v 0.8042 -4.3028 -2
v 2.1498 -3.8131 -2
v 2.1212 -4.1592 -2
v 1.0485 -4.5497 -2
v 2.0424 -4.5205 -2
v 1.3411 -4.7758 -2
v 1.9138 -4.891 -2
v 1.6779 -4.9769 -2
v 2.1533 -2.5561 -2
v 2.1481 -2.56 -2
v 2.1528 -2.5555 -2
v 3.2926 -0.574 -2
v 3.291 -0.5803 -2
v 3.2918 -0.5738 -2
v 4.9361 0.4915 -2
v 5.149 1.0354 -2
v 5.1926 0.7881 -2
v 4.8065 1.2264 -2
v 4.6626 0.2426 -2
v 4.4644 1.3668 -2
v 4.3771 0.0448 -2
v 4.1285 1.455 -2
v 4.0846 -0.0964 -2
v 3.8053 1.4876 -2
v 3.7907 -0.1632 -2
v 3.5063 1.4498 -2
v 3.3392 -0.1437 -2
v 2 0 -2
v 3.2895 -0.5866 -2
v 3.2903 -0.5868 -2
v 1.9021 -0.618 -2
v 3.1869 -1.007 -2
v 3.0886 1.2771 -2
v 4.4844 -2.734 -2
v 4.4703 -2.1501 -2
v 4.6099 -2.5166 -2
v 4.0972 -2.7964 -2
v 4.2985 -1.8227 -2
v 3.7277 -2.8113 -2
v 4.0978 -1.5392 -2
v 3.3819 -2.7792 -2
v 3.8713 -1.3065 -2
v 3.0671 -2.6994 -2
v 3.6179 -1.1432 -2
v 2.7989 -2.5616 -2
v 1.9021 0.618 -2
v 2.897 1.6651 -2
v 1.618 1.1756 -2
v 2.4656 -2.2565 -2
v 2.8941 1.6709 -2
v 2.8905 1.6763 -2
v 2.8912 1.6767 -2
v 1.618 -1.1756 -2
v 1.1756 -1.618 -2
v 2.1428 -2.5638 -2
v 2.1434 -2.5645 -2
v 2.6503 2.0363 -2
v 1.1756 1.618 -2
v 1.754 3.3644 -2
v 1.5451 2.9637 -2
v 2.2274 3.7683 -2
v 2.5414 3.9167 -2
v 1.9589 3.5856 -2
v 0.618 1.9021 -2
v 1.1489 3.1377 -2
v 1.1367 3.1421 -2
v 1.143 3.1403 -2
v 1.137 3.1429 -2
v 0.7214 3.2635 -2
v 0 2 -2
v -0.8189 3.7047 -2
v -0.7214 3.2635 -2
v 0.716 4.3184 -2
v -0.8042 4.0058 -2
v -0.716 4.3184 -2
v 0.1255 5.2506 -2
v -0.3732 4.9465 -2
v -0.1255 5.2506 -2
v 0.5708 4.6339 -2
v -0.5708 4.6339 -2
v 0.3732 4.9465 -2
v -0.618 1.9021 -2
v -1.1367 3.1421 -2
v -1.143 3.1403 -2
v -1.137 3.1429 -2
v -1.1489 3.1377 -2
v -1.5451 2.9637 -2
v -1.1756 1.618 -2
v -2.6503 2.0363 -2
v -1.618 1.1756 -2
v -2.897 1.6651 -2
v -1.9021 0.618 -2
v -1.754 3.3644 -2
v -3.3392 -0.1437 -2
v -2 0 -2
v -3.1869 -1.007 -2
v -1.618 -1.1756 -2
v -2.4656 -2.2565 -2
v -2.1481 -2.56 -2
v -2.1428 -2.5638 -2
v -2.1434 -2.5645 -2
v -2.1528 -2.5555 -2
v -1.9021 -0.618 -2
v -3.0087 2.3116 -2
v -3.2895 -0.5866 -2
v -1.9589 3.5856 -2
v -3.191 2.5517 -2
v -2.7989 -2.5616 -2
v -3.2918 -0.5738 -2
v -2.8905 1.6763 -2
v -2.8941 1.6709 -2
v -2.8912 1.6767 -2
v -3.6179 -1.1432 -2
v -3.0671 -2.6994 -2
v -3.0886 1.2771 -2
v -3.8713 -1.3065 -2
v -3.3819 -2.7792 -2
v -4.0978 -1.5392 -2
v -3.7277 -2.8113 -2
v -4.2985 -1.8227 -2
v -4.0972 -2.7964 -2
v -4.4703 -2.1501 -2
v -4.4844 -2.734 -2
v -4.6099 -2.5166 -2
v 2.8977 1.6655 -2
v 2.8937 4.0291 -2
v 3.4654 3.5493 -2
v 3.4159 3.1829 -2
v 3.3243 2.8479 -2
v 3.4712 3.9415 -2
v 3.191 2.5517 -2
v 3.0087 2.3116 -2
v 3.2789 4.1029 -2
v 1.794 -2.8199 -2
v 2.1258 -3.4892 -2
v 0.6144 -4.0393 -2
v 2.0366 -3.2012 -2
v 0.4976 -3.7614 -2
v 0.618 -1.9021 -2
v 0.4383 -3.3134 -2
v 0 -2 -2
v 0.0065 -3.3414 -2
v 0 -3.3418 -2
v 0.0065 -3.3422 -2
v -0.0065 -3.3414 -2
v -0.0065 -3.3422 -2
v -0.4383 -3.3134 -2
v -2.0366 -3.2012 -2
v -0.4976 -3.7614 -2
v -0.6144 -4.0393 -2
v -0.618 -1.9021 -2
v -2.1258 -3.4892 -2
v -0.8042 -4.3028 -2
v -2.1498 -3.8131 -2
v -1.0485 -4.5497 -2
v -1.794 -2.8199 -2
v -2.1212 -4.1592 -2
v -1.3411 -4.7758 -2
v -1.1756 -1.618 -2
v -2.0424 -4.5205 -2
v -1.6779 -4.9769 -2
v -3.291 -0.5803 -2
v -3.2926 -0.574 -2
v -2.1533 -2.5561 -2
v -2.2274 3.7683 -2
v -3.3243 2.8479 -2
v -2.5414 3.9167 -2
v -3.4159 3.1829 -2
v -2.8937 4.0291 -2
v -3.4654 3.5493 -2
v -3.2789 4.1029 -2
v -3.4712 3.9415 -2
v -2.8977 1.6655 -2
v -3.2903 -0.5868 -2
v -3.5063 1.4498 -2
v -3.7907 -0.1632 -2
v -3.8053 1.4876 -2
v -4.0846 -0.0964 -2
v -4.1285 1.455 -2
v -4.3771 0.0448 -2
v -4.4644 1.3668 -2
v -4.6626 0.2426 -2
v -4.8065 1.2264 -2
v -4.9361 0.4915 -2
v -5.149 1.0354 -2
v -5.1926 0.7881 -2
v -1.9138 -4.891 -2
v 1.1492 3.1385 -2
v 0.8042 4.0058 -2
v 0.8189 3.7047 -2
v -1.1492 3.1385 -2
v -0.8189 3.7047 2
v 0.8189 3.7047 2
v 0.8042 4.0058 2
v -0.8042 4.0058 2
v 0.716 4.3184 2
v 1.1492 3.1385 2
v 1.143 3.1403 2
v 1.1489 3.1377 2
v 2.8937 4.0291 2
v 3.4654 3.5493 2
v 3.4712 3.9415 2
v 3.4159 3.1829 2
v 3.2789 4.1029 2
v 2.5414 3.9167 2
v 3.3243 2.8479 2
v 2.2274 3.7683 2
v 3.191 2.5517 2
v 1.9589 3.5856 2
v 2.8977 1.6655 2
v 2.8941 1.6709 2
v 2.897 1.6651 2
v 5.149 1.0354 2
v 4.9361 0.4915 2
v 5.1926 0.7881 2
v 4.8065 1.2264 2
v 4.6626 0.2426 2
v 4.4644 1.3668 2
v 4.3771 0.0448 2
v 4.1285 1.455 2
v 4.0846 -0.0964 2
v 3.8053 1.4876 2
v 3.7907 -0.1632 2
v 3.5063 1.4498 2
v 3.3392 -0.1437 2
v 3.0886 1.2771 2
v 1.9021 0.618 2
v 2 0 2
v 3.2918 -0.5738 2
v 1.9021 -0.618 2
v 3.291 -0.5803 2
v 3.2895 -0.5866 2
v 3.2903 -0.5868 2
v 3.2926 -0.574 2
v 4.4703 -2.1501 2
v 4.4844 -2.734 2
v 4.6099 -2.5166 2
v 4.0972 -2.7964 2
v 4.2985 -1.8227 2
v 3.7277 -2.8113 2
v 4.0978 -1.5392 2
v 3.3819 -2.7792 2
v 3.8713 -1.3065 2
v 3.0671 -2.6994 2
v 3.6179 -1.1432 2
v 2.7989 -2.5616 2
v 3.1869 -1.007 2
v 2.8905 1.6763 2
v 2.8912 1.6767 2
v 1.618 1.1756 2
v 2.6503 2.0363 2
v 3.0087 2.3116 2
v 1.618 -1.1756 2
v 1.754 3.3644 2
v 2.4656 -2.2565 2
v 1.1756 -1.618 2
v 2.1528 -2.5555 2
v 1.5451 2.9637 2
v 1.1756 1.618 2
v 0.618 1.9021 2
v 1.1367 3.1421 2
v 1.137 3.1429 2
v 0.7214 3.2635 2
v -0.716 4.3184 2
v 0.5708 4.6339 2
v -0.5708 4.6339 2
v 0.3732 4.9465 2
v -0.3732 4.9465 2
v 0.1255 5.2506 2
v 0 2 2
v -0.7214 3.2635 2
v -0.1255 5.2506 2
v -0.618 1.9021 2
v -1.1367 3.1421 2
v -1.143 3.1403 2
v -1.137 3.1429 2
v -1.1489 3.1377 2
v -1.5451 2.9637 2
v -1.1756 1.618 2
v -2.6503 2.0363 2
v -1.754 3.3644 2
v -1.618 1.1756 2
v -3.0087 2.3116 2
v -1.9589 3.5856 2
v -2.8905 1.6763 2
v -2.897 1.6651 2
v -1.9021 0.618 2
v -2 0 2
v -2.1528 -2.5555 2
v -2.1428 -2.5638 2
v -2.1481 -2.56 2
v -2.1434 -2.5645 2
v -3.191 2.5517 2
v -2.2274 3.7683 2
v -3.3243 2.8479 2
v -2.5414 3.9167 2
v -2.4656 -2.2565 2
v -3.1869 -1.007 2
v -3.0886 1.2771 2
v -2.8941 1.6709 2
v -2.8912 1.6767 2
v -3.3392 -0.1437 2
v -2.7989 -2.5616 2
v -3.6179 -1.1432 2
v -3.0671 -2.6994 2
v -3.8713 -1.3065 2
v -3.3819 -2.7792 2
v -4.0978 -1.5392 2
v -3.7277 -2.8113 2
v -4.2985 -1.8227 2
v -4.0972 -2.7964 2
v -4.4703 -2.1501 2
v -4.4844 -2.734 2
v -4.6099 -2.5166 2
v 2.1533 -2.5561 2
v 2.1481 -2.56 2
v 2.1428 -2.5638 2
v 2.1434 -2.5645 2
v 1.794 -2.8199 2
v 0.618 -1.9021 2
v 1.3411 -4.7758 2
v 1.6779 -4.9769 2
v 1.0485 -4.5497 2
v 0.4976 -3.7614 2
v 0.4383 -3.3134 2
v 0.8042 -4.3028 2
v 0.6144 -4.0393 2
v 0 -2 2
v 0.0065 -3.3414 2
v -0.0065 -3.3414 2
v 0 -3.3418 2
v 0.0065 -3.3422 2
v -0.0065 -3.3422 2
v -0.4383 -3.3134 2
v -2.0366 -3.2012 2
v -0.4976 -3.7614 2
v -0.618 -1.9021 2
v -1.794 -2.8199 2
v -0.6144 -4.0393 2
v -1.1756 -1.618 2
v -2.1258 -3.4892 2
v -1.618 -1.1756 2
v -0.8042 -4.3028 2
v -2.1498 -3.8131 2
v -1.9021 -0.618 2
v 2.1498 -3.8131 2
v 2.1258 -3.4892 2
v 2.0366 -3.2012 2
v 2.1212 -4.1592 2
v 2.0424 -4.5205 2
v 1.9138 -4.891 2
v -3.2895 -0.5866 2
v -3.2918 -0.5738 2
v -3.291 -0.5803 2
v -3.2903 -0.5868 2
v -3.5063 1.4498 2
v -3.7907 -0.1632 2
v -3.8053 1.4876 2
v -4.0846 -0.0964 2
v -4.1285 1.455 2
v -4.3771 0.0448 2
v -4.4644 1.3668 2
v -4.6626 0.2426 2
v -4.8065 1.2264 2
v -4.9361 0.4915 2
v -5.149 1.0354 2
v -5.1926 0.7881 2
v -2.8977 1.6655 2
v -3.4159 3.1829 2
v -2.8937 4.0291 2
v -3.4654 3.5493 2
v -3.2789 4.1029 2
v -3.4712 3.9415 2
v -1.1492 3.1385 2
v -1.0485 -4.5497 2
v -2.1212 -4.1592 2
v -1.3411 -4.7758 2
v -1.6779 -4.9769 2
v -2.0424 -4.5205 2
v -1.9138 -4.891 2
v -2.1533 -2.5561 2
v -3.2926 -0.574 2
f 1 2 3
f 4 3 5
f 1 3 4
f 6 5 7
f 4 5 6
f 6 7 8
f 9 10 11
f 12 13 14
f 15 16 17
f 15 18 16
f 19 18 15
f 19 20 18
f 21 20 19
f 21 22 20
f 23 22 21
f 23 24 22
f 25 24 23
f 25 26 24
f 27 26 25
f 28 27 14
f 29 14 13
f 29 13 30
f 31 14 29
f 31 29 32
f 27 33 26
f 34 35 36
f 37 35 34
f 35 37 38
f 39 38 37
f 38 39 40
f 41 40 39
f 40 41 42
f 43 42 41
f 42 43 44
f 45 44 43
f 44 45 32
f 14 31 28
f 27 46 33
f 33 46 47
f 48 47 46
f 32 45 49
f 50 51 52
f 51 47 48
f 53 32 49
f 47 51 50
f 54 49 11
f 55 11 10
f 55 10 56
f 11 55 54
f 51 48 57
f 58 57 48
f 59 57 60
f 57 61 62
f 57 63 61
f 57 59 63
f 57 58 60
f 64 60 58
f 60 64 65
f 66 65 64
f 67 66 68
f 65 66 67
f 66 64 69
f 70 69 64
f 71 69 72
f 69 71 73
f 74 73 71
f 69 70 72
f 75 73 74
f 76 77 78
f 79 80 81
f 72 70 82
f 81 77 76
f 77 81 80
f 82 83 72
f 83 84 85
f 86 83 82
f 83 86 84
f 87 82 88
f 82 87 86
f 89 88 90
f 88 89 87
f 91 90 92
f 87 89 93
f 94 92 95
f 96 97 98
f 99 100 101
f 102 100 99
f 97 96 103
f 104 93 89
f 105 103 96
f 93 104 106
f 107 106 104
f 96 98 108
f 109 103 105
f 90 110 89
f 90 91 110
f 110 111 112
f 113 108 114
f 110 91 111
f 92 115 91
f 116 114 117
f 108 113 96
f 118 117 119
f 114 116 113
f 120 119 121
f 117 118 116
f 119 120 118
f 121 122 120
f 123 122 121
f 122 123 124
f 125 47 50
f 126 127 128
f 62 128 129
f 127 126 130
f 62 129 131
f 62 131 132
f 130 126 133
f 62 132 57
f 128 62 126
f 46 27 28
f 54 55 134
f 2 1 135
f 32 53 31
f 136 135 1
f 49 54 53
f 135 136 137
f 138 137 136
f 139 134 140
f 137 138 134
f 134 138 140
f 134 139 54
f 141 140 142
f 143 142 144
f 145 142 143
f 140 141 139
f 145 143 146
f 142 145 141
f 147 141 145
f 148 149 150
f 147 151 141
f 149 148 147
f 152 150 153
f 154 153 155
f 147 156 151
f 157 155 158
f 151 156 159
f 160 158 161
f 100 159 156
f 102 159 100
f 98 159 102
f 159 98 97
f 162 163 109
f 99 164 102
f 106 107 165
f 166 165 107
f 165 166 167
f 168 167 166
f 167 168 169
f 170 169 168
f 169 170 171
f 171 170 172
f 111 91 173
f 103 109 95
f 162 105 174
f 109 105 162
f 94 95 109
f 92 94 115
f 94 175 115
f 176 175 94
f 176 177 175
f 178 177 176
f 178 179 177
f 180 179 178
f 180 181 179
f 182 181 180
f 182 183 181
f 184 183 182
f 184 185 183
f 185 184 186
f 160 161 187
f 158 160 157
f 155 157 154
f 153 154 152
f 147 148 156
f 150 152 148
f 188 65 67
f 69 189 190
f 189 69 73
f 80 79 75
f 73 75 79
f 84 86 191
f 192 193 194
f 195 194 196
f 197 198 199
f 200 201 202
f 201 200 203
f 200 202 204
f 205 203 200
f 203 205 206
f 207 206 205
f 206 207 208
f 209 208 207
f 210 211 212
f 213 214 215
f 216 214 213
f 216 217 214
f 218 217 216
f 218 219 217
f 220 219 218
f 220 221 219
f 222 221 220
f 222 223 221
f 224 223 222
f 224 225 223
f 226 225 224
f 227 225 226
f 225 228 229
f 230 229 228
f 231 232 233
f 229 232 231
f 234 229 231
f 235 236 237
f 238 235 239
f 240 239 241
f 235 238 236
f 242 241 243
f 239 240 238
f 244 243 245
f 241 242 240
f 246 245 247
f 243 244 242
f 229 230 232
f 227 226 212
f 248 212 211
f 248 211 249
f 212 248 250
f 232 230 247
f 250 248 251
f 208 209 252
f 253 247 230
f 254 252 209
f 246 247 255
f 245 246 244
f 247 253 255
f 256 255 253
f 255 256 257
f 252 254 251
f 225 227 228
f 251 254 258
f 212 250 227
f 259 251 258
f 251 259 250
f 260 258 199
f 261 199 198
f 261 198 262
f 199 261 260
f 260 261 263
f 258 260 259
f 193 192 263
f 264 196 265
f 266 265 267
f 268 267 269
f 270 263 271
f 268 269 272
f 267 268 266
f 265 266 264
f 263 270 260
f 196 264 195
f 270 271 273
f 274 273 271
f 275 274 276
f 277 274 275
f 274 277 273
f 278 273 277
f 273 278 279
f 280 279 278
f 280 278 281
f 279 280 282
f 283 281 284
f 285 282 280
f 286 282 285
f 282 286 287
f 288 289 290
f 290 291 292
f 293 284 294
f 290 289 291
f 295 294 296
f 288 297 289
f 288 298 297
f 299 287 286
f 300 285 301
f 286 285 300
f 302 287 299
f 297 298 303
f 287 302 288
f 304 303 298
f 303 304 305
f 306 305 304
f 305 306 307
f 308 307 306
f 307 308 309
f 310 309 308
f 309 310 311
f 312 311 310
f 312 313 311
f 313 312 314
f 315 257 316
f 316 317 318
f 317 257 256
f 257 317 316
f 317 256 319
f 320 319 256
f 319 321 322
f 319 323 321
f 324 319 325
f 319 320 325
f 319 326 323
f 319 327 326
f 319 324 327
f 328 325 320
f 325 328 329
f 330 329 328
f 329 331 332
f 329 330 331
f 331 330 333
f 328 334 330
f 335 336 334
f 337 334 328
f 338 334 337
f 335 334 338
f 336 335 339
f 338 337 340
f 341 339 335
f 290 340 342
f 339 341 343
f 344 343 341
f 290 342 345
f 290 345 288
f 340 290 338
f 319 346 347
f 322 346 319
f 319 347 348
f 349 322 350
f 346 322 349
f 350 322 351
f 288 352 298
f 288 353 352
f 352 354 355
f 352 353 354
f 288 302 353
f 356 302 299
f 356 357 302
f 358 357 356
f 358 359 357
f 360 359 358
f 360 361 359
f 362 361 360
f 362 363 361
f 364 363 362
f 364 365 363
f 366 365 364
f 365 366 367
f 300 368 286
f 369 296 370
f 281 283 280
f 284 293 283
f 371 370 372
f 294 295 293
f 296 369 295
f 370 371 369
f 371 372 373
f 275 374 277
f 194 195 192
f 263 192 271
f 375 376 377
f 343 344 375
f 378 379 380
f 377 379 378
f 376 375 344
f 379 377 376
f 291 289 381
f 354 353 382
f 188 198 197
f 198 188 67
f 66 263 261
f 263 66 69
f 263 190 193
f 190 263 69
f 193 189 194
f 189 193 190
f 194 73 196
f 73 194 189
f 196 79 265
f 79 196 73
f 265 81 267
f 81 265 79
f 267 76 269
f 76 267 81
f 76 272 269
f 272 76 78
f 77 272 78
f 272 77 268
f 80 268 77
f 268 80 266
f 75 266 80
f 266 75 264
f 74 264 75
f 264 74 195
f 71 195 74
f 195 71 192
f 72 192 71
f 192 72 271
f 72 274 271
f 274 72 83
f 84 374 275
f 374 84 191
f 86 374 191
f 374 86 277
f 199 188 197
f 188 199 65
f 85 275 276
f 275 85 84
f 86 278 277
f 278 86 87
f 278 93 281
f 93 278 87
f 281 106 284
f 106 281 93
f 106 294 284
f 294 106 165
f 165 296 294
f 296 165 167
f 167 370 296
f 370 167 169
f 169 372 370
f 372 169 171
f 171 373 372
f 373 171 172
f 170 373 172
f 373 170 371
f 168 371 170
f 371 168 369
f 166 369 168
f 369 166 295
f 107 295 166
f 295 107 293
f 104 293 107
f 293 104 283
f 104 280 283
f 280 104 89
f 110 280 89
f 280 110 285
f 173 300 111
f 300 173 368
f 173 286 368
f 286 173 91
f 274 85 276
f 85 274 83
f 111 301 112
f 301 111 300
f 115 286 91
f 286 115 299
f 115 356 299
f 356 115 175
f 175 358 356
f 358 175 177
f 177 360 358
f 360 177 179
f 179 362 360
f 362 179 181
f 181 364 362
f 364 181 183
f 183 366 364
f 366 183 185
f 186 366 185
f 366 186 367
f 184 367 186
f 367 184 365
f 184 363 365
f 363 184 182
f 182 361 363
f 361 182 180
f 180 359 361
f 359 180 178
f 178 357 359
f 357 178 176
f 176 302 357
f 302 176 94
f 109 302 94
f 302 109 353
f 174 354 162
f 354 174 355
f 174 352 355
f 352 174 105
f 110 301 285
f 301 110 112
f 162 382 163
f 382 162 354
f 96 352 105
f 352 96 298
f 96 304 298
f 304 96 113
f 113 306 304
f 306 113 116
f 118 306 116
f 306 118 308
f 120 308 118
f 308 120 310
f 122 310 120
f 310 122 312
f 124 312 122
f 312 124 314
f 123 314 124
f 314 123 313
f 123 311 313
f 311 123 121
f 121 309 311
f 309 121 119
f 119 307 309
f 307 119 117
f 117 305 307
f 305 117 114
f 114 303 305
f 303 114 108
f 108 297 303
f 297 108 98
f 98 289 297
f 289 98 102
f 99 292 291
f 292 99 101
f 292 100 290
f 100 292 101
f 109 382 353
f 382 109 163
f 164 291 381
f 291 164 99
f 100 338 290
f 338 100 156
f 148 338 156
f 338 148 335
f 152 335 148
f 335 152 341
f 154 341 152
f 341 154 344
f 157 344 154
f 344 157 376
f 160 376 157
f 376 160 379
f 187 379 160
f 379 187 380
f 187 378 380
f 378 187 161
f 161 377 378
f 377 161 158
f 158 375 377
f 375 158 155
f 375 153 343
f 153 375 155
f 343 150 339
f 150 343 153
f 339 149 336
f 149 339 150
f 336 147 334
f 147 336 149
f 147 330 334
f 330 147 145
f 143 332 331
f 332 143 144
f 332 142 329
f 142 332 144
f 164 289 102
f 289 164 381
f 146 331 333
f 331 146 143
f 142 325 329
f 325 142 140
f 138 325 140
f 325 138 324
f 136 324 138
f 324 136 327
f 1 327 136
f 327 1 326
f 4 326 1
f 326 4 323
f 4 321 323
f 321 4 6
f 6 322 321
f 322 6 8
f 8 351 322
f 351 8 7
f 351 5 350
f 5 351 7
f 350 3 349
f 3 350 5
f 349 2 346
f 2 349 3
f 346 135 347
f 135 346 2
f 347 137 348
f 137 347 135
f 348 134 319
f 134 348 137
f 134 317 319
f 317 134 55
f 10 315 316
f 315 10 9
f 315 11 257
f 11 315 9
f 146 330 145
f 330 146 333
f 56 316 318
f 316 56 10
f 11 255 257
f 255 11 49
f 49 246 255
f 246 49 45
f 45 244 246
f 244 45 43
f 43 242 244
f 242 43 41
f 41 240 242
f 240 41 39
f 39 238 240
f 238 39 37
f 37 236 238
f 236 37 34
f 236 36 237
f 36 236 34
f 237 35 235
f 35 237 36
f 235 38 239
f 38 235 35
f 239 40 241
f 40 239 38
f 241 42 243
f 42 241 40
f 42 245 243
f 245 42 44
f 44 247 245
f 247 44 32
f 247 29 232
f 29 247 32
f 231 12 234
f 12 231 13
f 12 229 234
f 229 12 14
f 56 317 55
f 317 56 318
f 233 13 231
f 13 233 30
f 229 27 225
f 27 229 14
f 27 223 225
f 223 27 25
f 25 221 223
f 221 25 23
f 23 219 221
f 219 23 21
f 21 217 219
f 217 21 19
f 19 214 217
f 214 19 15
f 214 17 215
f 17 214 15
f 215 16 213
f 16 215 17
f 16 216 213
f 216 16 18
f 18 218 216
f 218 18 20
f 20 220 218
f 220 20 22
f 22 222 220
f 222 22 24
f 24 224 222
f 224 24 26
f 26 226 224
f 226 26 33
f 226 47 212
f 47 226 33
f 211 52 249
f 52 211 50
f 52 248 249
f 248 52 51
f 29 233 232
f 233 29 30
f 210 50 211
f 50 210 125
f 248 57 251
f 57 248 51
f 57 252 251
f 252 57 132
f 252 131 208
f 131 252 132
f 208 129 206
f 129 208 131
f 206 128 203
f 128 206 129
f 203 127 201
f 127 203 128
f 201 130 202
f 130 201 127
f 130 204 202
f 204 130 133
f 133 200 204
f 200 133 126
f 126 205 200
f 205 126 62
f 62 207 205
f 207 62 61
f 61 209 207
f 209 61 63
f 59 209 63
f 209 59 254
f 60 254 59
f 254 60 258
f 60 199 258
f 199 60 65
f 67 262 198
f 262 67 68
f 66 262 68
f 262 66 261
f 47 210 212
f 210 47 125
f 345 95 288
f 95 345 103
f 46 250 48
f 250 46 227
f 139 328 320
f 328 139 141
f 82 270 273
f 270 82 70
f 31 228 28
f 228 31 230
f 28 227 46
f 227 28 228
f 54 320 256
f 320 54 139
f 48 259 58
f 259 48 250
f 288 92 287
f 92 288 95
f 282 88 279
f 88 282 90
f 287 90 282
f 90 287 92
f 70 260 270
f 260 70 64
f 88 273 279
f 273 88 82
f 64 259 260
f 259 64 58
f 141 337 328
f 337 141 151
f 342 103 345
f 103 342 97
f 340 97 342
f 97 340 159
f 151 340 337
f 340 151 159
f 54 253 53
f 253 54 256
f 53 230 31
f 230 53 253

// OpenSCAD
//////////////////////////////////////////////////////////////////////////////////////////////
// Public Domain Parametric Involute Spur Gear (and involute helical gear and involute rack)
// version 1.1
// by Leemon Baird, 2011, Leemon@Leemon.com
//http://www.thingiverse.com/thing:5505
//
// This file is public domain.  Use it for any purpose, including commercial
// applications.  Attribution would be nice, but is not required.  There is
// no warranty of any kind, including its correctness, usefulness, or safety.
// 
// This is parameterized involute spur (or helical) gear.  It is much simpler and less powerful than
// others on Thingiverse.  But it is public domain.  I implemented it from scratch from the 
// descriptions and equations on Wikipedia and the web, using Mathematica for calculations and testing,
// and I now release it into the public domain.
//
//		http://en.wikipedia.org/wiki/Involute_gear
//		http://en.wikipedia.org/wiki/Gear
//		http://en.wikipedia.org/wiki/List_of_gear_nomenclature
//		http://gtrebaol.free.fr/doc/catia/spur_gear.html
//		http://www.cs.cmu.edu/~rapidproto/mechanisms/chpt7.html
//
// The module gear() gives an involute spur gear, with reasonable defaults for all the parameters.
// Normally, you should just choose the first 4 parameters, and let the rest be default values.
// The module gear() gives a gear in the XY plane, centered on the origin, with one tooth centered on
// the positive Y axis.  The various functions below it take the same parameters, and return various
// measurements for the gear.  The most important is pitch_radius, which tells how far apart to space
// gears that are meshing, and adendum_radius, which gives the size of the region filled by the gear.
// A gear has a "pitch circle", which is an invisible circle that cuts through the middle of each
// tooth (though not the exact center). In order for two gears to mesh, their pitch circles should 
// just touch.  So the distance between their centers should be pitch_radius() for one, plus pitch_radius() 
// for the other, which gives the radii of their pitch circles.
//
// In order for two gears to mesh, they must have the same mm_per_tooth and pressure_angle parameters.  
// mm_per_tooth gives the number of millimeters of arc around the pitch circle covered by one tooth and one
// space between teeth.  The pitch angle controls how flat or bulged the sides of the teeth are.  Common
// values include 14.5 degrees and 20 degrees, and occasionally 25.  Though I've seen 28 recommended for
// plastic gears. Larger numbers bulge out more, giving stronger teeth, so 28 degrees is the default here.
//
// The ratio of number_of_teeth for two meshing gears gives how many times one will make a full 
// revolution when the the other makes one full revolution.  If the two numbers are coprime (i.e. 
// are not both divisible by the same number greater than 1), then every tooth on one gear
// will meet every tooth on the other, for more even wear.  So coprime numbers of teeth are good.
//
// The module rack() gives a rack, which is a bar with teeth.  A rack can mesh with any
// gear that has the same mm_per_tooth and pressure_angle.
//
// Some terminology: 
// The outline of a gear is a smooth circle (the "pitch circle") which has mountains and valleys
// added so it is toothed.  So there is an inner circle (the "root circle") that touches the 
// base of all the teeth, an outer circle that touches the tips of all the teeth,
// and the invisible pitch circle in between them.  There is also a "base circle", which can be smaller than
// all three of the others, which controls the shape of the teeth.  The side of each tooth lies on the path 
// that the end of a string would follow if it were wrapped tightly around the base circle, then slowly unwound.  
// That shape is an "involute", which gives this type of gear its name.
//
//////////////////////////////////////////////////////////////////////////////////////////////

//An involute spur gear, with reasonable defaults for all the parameters.
//Normally, you should just choose the first 4 parameters, and let the rest be default values.
//Meshing gears must match in mm_per_tooth, pressure_angle, and twist,
//and be separated by the sum of their pitch radii, which can be found with pitch_radius().
module gear (
	mm_per_tooth    = 3,    //this is the "circular pitch", the circumference of the pitch circle divided by the number of teeth
	number_of_teeth = 11,   //total number of teeth around the entire perimeter
	thickness       = 6,    //thickness of gear in mm
	hole_diameter   = 3,    //diameter of the hole in the center, in mm
	twist           = 0,    //teeth rotate this many degrees from bottom of gear to top.  360 makes the gear a screw with each thread going around once
	teeth_to_hide   = 0,    //number of teeth to delete to make this only a fraction of a circle
	pressure_angle  = 28,   //Controls how straight or bulged the tooth sides are. In degrees.
	clearance       = 0.0,  //gap between top of a tooth on one gear and bottom of valley on a meshing gear (in millimeters)
	backlash        = 0.0   //gap between two meshing teeth, in the direction along the circumference of the pitch circle
) {
	assign(pi = 3.1415926)
	assign(p  = mm_per_tooth * number_of_teeth / pi / 2)  //radius of pitch circle
	assign(c  = p + mm_per_tooth / pi - clearance)        //radius of outer circle
	assign(b  = p*cos(pressure_angle))                    //radius of base circle
	assign(r  = p-(c-p)-clearance)                        //radius of root circle
	assign(t  = mm_per_tooth/2-backlash/2)                //tooth thickness at pitch circle
	assign(k  = -iang(b, p) - t/2/p/pi*180) {             //angle to where involute meets base circle on each side of tooth
		difference() {
			for (i = [0:number_of_teeth-teeth_to_hide-1] )
				rotate([0,0,i*360/number_of_teeth])
					linear_extrude(height = thickness, center = true, convexity = 10, twist = twist)
						polygon(
							points=[
								[0, -hole_diameter/10],
								polar(r, -181/number_of_teeth),
								polar(r, r<b ? k : -180/number_of_teeth),
								q7(0/5,r,b,c,k, 1),q7(1/5,r,b,c,k, 1),q7(2/5,r,b,c,k, 1),q7(3/5,r,b,c,k, 1),q7(4/5,r,b,c,k, 1),q7(5/5,r,b,c,k, 1),
								q7(5/5,r,b,c,k,-1),q7(4/5,r,b,c,k,-1),q7(3/5,r,b,c,k,-1),q7(2/5,r,b,c,k,-1),q7(1/5,r,b,c,k,-1),q7(0/5,r,b,c,k,-1),
								polar(r, r<b ? -k : 180/number_of_teeth),
								polar(r, 181/number_of_teeth)
							],
 							paths=[[0,1,2,3,4,5,6,7,8,9,10,11,12,13,14,15,16]]
						);
			cylinder(h=2*thickness+1, r=hole_diameter/2, center=true, $fn=20);
		}
	}
};	
//these 4 functions are used by gear
function polar(r,theta)   = r*[sin(theta), cos(theta)];                            //convert polar to cartesian coordinates
function iang(r1,r2)      = sqrt((r2/r1)*(r2/r1) - 1)/3.1415926*180 - acos(r1/r2); //unwind a string this many degrees to go from radius r1 to radius r2
function q7(f,r,b,r2,t,s) = q6(b,s,t,(1-f)*max(b,r)+f*r2);                         //radius a fraction f up the curved side of the tooth 
function q6(b,s,t,d)      = polar(d,s*(iang(b,d)+t));                              //point at radius d on the involute curve

//a rack, which is a straight line with teeth (the same as a segment from a giant gear with a huge number of teeth).
//The "pitch circle" is a line along the X axis.
module rack (
	mm_per_tooth    = 3,    //this is the "circular pitch", the circumference of the pitch circle divided by the number of teeth
	number_of_teeth = 11,   //total number of teeth along the rack
	thickness       = 6,    //thickness of rack in mm (affects each tooth)
	height          = 120,   //height of rack in mm, from tooth top to far side of rack.
	pressure_angle  = 28,   //Controls how straight or bulged the tooth sides are. In degrees.
	backlash        = 0.0   //gap between two meshing teeth, in the direction along the circumference of the pitch circle
) {
	assign(pi = 3.1415926)
	assign(a = mm_per_tooth / pi) //addendum
	assign(t = a*cos(pressure_angle)-1)         //tooth side is tilted so top/bottom corners move this amount
		for (i = [0:number_of_teeth-1] )
			translate([i*mm_per_tooth,0,0])
				linear_extrude(height = thickness, center = true, convexity = 10)
					polygon(
						points=[
							[-mm_per_tooth * 3/4,                 a-height],
							[-mm_per_tooth * 3/4 - backlash,     -a],
							[-mm_per_tooth * 1/4 + backlash - t, -a],
							[-mm_per_tooth * 1/4 + backlash + t,  a],
							[ mm_per_tooth * 1/4 - backlash - t,  a],
							[ mm_per_tooth * 1/4 - backlash + t, -a],
							[ mm_per_tooth * 3/4 + backlash,     -a],
							[ mm_per_tooth * 3/4,                 a-height],
						],
						paths=[[0,1,2,3,4,5,6,7]]
					);
};	

//These 5 functions let the user find the derived dimensions of the gear.
//A gear fits within a circle of radius outer_radius, and two gears should have
//their centers separated by the sum of their pictch_radius.
function circular_pitch  (mm_per_tooth=3) = mm_per_tooth;                     //tooth density expressed as "circular pitch" in millimeters
function diametral_pitch (mm_per_tooth=3) = 3.1415926 / mm_per_tooth;         //tooth density expressed as "diametral pitch" in teeth per millimeter
function module_value    (mm_per_tooth=3) = mm_per_tooth / pi;                //tooth density expressed as "module" or "modulus" in millimeters
function pitch_radius    (mm_per_tooth=3,number_of_teeth=11) = mm_per_tooth * number_of_teeth / 3.1415926 / 2;
function outer_radius    (mm_per_tooth=3,number_of_teeth=11,clearance=0.1)    //The gear fits entirely within a cylinder of this radius.
	= mm_per_tooth*(1+number_of_teeth/2)/3.1415926  - clearance;              

//////////////////////////////////////////////////////////////////////////////////////////////
//example gear train.  
//Try it with OpenSCAD View/Animate command with 20 steps and 24 FPS.
//The gears will continue to be rotated to mesh correctly if you change the number of teeth.
$fn=200;

n1 = 9; //Number of teeth
mm_per_tooth = 3; //all meshing gears need the same mm_per_tooth (and the same pressure_angle)
thickness    = 4;
hole         = 4;
height       = 12;

d1 =pitch_radius(mm_per_tooth,n1);
od = outer_radius(mm_per_tooth,n1) * 2;
echo("Pitch radius = ", d1, "Outside diameter = ", od);

gear(mm_per_tooth,n1,thickness,hole);

/*
union() {
  difference() {
  	  gear(mm_per_tooth,n1,thickness,hole);
	  translate([d1-7,0,-thickness/2]) cylinder(r=2, h=thickness*2);
  }
  difference() {
    translate([0,0,thickness/2]) cylinder(r=4.5,h=8);
    translate([0,0,thickness/2]) cylinder(r=4.8/2, h=8);
    cylinder(r=hole/2, h=8);
    translate([0,4.5,thickness/2 + 5]) rotate(a=[90,0,0]) cylinder(r=1.1,h=9);
    translate([-1.1,-4.5,thickness/2 + 5]) cube(size=[2.2, 9, 5]);
  }
}

//#translate([-1.1,-4.5,thickness/2 + 5]) cube(size=[2.2, 9, 5]);


// 5 teeth            :  5.57042               15.3972
// 7 teeth, 7 mm/tooth:  7.79859 pitch radius, 19.8535 outer diameter
// 9 teeth            : 10.0268                24.3009
// 14 teeth           : 15.5973                35.4507
// 18 teeth           : 20.0535                44.3634

// 7 teeth, 5 mm/tooth:  5.57042 PR, 14.1239 OD

*/
